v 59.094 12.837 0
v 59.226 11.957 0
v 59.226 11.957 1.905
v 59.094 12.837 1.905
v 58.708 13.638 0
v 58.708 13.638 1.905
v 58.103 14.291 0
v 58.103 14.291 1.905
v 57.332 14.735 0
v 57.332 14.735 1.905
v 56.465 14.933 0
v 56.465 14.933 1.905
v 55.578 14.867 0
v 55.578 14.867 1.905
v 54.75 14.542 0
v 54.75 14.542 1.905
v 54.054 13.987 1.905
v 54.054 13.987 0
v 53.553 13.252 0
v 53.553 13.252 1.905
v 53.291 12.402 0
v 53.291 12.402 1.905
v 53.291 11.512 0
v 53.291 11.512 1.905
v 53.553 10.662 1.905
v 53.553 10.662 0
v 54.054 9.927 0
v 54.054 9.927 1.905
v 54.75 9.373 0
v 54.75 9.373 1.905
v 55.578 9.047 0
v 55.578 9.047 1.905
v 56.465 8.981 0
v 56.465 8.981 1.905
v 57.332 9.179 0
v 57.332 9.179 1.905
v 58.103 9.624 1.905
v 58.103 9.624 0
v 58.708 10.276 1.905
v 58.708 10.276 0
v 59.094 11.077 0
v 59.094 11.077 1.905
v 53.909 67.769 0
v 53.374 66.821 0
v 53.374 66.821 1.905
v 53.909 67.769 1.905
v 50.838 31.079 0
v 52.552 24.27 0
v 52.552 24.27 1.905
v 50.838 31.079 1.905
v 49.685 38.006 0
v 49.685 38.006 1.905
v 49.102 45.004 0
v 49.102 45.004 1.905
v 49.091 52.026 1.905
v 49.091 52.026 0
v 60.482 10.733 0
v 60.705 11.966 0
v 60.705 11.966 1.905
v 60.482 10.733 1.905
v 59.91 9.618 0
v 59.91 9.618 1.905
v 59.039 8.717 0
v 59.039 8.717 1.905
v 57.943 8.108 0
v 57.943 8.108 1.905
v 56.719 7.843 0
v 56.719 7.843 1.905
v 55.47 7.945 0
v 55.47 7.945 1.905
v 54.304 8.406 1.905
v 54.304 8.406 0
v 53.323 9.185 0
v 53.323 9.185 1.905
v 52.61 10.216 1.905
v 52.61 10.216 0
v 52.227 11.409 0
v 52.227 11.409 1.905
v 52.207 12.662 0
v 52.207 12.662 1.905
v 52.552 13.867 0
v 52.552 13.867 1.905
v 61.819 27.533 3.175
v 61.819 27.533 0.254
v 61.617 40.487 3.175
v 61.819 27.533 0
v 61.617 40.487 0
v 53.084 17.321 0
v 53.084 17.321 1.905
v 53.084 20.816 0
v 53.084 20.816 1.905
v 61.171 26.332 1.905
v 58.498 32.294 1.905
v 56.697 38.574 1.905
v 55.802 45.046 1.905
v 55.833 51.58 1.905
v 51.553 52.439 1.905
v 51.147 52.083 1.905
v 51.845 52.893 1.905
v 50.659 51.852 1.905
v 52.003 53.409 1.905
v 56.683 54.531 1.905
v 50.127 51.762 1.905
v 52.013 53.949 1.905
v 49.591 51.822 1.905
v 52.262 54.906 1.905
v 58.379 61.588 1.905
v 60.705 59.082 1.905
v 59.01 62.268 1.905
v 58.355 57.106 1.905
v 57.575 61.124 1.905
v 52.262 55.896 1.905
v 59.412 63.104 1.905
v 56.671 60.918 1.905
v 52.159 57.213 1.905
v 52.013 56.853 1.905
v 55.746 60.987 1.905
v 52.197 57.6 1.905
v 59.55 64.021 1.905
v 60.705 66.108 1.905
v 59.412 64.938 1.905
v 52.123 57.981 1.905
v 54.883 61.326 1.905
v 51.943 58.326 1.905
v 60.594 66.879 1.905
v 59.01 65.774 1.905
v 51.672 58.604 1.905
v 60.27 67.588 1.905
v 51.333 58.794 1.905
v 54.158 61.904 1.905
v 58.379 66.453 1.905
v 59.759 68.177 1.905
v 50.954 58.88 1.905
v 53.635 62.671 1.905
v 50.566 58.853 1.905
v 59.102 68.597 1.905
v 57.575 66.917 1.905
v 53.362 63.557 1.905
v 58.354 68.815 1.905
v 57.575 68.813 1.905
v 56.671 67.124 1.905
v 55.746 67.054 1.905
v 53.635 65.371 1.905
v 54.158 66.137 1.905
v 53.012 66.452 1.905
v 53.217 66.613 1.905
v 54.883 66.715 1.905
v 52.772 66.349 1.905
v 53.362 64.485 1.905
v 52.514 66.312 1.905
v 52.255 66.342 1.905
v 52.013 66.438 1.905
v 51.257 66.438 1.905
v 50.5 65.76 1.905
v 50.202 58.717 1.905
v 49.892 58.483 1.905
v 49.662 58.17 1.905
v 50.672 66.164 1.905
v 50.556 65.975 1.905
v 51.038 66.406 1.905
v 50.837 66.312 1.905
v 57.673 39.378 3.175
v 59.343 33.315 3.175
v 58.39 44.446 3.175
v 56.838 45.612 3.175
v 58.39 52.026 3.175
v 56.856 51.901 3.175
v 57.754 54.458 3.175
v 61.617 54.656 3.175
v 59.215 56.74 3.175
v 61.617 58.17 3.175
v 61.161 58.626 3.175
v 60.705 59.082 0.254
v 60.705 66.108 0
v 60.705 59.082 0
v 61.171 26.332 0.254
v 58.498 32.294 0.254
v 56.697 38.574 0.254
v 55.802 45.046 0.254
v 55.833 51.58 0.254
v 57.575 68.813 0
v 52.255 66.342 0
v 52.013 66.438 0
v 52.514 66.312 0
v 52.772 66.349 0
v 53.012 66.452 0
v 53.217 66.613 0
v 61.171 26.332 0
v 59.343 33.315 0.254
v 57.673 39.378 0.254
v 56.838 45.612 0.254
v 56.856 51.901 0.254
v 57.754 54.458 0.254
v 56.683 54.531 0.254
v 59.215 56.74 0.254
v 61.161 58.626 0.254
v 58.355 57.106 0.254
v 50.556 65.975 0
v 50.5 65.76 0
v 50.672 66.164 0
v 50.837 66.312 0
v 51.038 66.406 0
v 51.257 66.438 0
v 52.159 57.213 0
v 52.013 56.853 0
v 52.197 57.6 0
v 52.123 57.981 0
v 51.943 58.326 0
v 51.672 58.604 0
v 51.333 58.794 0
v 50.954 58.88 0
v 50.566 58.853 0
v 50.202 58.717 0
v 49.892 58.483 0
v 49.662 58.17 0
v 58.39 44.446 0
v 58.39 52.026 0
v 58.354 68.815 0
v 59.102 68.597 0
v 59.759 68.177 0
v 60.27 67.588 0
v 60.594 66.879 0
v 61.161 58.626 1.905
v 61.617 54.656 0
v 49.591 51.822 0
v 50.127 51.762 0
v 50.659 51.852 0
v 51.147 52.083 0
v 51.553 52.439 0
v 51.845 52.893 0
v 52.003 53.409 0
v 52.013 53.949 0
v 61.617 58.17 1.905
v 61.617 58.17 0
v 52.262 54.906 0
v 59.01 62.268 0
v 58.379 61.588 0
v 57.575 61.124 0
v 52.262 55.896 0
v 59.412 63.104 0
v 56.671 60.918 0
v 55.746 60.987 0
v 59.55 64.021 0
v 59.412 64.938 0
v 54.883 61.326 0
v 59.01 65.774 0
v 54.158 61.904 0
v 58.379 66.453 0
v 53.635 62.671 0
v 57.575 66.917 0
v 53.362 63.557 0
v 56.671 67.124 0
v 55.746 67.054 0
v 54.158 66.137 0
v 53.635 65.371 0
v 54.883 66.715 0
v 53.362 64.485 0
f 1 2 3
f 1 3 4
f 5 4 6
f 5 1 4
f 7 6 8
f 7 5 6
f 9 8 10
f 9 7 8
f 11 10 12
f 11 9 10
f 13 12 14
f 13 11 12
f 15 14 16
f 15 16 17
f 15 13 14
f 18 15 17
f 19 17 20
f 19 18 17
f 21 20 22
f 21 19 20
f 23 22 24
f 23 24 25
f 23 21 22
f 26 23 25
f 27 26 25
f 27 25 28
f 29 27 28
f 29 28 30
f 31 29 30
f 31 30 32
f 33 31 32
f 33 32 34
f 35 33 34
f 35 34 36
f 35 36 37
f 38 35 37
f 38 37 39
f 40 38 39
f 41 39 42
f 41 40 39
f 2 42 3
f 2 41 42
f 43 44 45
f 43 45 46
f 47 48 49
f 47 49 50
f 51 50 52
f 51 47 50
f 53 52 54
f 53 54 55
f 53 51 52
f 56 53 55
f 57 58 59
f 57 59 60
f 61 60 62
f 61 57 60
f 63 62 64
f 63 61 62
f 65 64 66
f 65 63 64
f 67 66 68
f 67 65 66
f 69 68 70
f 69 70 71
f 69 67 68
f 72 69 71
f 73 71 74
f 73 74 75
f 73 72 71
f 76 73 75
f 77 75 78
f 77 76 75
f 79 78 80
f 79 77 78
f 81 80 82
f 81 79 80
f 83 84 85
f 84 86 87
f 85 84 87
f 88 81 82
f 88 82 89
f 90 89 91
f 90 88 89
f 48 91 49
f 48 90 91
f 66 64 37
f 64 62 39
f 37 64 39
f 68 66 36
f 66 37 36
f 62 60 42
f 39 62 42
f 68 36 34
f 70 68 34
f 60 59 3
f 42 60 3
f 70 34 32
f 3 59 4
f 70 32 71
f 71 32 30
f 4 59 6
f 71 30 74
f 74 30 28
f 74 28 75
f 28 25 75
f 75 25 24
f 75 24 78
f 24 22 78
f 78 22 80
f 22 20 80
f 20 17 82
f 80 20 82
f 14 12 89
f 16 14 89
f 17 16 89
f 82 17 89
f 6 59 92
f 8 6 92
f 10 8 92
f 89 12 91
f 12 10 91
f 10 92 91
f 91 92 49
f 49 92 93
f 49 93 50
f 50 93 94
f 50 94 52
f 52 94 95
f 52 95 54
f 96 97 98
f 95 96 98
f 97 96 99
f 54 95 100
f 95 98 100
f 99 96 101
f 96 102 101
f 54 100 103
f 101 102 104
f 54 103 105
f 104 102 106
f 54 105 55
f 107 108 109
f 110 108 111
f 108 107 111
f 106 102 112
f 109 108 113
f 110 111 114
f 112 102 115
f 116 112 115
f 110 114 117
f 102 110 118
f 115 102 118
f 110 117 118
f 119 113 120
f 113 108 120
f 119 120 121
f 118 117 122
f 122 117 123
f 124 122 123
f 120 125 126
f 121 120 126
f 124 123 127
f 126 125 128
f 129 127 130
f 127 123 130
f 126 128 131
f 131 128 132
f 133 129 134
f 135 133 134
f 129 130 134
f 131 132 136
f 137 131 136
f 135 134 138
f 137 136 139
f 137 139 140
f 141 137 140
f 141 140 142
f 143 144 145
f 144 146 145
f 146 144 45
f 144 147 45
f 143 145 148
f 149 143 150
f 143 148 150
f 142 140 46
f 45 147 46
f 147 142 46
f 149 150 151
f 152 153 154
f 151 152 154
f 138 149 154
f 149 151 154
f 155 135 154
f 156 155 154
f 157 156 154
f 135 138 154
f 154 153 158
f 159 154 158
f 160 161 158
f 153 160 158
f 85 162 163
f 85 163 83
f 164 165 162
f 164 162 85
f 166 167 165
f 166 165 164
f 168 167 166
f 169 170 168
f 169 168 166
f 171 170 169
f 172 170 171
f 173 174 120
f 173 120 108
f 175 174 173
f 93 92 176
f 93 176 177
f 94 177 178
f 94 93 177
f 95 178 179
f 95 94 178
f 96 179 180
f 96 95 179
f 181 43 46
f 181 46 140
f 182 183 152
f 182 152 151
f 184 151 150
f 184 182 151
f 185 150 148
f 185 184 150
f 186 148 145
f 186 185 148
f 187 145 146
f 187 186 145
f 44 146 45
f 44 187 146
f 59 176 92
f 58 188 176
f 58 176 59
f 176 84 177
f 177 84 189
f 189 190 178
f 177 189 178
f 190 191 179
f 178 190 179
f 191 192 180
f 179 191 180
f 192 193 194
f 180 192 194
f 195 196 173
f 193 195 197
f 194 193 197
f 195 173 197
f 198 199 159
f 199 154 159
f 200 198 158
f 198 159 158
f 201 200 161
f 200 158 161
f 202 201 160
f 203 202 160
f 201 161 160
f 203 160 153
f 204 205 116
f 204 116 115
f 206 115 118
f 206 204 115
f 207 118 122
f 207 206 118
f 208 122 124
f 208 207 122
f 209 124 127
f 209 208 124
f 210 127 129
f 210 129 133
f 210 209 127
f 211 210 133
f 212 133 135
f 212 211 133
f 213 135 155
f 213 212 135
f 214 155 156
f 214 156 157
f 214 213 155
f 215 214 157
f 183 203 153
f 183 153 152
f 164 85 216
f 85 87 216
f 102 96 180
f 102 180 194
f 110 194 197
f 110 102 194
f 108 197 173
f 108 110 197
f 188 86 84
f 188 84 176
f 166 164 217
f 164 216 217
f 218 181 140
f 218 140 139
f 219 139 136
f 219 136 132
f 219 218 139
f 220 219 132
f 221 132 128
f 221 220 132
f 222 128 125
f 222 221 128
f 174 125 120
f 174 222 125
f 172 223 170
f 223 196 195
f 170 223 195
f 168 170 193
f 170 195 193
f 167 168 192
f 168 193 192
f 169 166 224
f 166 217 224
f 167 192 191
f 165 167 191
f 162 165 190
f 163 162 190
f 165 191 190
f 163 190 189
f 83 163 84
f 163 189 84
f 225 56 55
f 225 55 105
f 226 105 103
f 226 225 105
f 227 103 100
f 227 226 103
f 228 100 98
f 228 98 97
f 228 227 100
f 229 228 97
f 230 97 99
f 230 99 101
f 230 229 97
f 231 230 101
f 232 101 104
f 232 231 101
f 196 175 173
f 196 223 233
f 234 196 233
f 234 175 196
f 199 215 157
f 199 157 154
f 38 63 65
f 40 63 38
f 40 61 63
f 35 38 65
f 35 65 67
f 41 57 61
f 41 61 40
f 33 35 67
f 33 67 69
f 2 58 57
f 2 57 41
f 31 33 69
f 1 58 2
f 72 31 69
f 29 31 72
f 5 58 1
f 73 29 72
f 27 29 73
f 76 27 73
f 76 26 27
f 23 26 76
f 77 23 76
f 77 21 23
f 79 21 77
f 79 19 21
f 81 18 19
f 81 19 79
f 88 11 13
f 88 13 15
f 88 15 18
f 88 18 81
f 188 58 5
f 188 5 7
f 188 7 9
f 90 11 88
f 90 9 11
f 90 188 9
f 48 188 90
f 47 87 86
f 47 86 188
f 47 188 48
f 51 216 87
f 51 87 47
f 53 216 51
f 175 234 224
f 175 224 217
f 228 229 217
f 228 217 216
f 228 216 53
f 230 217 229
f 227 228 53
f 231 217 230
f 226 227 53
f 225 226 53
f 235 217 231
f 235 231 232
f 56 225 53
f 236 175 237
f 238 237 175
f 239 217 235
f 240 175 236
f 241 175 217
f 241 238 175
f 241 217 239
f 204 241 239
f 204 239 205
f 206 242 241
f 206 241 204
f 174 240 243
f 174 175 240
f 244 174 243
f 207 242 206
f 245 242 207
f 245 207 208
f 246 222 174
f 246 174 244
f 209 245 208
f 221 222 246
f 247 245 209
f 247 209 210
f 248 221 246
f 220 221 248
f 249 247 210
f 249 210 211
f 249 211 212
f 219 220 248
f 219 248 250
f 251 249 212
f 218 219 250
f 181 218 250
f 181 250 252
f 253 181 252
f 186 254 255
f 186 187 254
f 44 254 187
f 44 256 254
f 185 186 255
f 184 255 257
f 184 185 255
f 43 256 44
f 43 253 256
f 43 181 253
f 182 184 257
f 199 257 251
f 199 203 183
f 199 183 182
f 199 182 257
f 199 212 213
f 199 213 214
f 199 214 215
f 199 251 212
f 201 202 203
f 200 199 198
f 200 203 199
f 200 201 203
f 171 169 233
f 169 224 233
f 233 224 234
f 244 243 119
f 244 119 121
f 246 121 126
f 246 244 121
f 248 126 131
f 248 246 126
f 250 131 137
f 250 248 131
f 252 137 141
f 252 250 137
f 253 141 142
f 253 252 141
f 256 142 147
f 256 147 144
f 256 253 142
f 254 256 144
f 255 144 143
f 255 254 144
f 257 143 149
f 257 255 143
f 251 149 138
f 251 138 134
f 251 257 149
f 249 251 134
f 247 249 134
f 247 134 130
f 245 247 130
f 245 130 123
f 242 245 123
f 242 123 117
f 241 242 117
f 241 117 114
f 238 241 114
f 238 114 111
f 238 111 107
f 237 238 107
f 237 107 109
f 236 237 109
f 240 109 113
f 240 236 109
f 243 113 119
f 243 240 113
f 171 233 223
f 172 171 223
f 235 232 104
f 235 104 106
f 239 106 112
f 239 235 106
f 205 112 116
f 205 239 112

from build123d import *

# Parameters (mm, degrees)
SKETCH1_R           = 3.1115
SKETCH1_R_2         = 2.9845
BOSS_EXTRUDE1_DEPTH = 1.905
CUT_EXTRUDE1_DEPTH  = 1.651
BOSS_EXTRUDE2_DEPTH = 1.27
FILLET4_R           = 0.762


with BuildPart() as part:
    # Sketch1 → Boss-Extrude1 (new body)
    with BuildSketch(Plane.XY):
        with BuildLine():
            Line((61.17139063, 26.332220791), (60.704944856, 11.966179777))
            ThreePointArc((60.704944856, 11.966179777), (55.469656343, 7.945478091), (52.551985386, 13.866751944))
            ThreePointArc((52.551985386, 13.866751944), (53.150243594, 19.068304512), (52.551985386, 24.269857079))
            ThreePointArc((52.551985386, 24.269857079), (49.685224569, 38.006015424), (49.090889591, 52.025542148))
            ThreePointArc((49.090889591, 52.025542148), (51.146965053, 52.083276575), (52.012792223, 53.949053326))
            ThreePointArc((52.012792223, 53.949053326), (52.29374244, 55.401070195), (52.012792223, 56.853087065))
            ThreePointArc((52.012792223, 56.853087065), (51.509420049, 58.711680371), (49.661768019, 58.169523016))
            Line((49.661768019, 58.169523016), (50.574786632, 66.4382933))
            Line((50.574786632, 66.4382933), (52.012792223, 66.4382933))
            ThreePointArc((52.012792223, 66.4382933), (52.772258586, 66.349188863), (53.373853233, 66.821219197))
            Line((53.373853233, 66.821219197), (53.909482304, 67.76887063))
            Line((53.909482304, 67.76887063), (57.57460461, 68.813123354))
            ThreePointArc((57.57460461, 68.813123354), (59.75855859, 68.176663617), (60.704944856, 66.10806771))
            Line((60.704944856, 66.10806771), (60.704944856, 59.081610081))
            Line((60.704944856, 59.081610081), (61.617031921, 58.169523016))
            Line((61.617031921, 58.169523016), (61.617031921, 54.655997897))
            Line((61.617031921, 54.655997897), (58.390036251, 52.025542148))
            Line((58.390036251, 52.025542148), (58.390036251, 44.445572853))
            Line((58.390036251, 44.445572853), (61.617031921, 40.486752766))
            Line((61.617031921, 40.486752766), (61.819220674, 27.533280913))
            Line((61.819220674, 27.533280913), (61.17139063, 26.332220791))
        make_face()
        with Locations((56.438703811, 64.020773394)):
            Circle(SKETCH1_R, mode=Mode.SUBTRACT)
        with Locations((56.241951704, 11.95715462)):
            Circle(SKETCH1_R_2, mode=Mode.SUBTRACT)
    extrude(amount=BOSS_EXTRUDE1_DEPTH)

    # Sketch2 → Cut-Extrude1 (cut)
    with BuildSketch(Plane.XY.offset(1.905)):
        with BuildLine():
            Line((60.704944856, 59.081610081), (61.160988389, 58.625566549))
            ThreePointArc((61.160988389, 58.625566549), (58.418398779, 55.641187467), (56.855649817, 51.901383735))
            ThreePointArc((56.855649817, 51.901383735), (57.672831025, 39.378266905), (61.819220674, 27.533280913))
            Line((61.819220674, 27.533280913), (61.17139063, 26.332220791))
            ThreePointArc((61.17139063, 26.332220791), (56.696533643, 38.574284868), (55.8334865, 51.57996161))
            ThreePointArc((55.8334865, 51.57996161), (57.423428617, 55.880027317), (60.704944856, 59.081610081))
        make_face()
    extrude(amount=-CUT_EXTRUDE1_DEPTH, mode=Mode.SUBTRACT)

    # Sketch3 → Boss-Extrude2 (add)
    with BuildSketch(Plane.XY.offset(1.905)):
        with BuildLine():
            Line((61.819220674, 27.533280913), (61.617031921, 40.486752766))
            Line((61.617031921, 40.486752766), (58.390036251, 44.445572853))
            Line((58.390036251, 44.445572853), (58.390036251, 52.025542148))
            Line((58.390036251, 52.025542148), (61.617031921, 54.655997897))
            Line((61.617031921, 54.655997897), (61.617031921, 58.169523016))
            Line((61.617031921, 58.169523016), (61.160988389, 58.625566549))
            ThreePointArc((61.160988389, 58.625566549), (58.418398779, 55.641187467), (56.855649817, 51.901383735))
            ThreePointArc((56.855649817, 51.901383735), (57.672831025, 39.378266905), (61.819220674, 27.533280913))
        make_face()
    extrude(amount=BOSS_EXTRUDE2_DEPTH)

    # Fillet4
    fillet4_edges = [part.edges().sort_by_distance(p)[0] for p in [
        (50.574786632, 66.4382933, 0.9525),
    ]]
    fillet(fillet4_edges, radius=FILLET4_R)


solid = part.part
